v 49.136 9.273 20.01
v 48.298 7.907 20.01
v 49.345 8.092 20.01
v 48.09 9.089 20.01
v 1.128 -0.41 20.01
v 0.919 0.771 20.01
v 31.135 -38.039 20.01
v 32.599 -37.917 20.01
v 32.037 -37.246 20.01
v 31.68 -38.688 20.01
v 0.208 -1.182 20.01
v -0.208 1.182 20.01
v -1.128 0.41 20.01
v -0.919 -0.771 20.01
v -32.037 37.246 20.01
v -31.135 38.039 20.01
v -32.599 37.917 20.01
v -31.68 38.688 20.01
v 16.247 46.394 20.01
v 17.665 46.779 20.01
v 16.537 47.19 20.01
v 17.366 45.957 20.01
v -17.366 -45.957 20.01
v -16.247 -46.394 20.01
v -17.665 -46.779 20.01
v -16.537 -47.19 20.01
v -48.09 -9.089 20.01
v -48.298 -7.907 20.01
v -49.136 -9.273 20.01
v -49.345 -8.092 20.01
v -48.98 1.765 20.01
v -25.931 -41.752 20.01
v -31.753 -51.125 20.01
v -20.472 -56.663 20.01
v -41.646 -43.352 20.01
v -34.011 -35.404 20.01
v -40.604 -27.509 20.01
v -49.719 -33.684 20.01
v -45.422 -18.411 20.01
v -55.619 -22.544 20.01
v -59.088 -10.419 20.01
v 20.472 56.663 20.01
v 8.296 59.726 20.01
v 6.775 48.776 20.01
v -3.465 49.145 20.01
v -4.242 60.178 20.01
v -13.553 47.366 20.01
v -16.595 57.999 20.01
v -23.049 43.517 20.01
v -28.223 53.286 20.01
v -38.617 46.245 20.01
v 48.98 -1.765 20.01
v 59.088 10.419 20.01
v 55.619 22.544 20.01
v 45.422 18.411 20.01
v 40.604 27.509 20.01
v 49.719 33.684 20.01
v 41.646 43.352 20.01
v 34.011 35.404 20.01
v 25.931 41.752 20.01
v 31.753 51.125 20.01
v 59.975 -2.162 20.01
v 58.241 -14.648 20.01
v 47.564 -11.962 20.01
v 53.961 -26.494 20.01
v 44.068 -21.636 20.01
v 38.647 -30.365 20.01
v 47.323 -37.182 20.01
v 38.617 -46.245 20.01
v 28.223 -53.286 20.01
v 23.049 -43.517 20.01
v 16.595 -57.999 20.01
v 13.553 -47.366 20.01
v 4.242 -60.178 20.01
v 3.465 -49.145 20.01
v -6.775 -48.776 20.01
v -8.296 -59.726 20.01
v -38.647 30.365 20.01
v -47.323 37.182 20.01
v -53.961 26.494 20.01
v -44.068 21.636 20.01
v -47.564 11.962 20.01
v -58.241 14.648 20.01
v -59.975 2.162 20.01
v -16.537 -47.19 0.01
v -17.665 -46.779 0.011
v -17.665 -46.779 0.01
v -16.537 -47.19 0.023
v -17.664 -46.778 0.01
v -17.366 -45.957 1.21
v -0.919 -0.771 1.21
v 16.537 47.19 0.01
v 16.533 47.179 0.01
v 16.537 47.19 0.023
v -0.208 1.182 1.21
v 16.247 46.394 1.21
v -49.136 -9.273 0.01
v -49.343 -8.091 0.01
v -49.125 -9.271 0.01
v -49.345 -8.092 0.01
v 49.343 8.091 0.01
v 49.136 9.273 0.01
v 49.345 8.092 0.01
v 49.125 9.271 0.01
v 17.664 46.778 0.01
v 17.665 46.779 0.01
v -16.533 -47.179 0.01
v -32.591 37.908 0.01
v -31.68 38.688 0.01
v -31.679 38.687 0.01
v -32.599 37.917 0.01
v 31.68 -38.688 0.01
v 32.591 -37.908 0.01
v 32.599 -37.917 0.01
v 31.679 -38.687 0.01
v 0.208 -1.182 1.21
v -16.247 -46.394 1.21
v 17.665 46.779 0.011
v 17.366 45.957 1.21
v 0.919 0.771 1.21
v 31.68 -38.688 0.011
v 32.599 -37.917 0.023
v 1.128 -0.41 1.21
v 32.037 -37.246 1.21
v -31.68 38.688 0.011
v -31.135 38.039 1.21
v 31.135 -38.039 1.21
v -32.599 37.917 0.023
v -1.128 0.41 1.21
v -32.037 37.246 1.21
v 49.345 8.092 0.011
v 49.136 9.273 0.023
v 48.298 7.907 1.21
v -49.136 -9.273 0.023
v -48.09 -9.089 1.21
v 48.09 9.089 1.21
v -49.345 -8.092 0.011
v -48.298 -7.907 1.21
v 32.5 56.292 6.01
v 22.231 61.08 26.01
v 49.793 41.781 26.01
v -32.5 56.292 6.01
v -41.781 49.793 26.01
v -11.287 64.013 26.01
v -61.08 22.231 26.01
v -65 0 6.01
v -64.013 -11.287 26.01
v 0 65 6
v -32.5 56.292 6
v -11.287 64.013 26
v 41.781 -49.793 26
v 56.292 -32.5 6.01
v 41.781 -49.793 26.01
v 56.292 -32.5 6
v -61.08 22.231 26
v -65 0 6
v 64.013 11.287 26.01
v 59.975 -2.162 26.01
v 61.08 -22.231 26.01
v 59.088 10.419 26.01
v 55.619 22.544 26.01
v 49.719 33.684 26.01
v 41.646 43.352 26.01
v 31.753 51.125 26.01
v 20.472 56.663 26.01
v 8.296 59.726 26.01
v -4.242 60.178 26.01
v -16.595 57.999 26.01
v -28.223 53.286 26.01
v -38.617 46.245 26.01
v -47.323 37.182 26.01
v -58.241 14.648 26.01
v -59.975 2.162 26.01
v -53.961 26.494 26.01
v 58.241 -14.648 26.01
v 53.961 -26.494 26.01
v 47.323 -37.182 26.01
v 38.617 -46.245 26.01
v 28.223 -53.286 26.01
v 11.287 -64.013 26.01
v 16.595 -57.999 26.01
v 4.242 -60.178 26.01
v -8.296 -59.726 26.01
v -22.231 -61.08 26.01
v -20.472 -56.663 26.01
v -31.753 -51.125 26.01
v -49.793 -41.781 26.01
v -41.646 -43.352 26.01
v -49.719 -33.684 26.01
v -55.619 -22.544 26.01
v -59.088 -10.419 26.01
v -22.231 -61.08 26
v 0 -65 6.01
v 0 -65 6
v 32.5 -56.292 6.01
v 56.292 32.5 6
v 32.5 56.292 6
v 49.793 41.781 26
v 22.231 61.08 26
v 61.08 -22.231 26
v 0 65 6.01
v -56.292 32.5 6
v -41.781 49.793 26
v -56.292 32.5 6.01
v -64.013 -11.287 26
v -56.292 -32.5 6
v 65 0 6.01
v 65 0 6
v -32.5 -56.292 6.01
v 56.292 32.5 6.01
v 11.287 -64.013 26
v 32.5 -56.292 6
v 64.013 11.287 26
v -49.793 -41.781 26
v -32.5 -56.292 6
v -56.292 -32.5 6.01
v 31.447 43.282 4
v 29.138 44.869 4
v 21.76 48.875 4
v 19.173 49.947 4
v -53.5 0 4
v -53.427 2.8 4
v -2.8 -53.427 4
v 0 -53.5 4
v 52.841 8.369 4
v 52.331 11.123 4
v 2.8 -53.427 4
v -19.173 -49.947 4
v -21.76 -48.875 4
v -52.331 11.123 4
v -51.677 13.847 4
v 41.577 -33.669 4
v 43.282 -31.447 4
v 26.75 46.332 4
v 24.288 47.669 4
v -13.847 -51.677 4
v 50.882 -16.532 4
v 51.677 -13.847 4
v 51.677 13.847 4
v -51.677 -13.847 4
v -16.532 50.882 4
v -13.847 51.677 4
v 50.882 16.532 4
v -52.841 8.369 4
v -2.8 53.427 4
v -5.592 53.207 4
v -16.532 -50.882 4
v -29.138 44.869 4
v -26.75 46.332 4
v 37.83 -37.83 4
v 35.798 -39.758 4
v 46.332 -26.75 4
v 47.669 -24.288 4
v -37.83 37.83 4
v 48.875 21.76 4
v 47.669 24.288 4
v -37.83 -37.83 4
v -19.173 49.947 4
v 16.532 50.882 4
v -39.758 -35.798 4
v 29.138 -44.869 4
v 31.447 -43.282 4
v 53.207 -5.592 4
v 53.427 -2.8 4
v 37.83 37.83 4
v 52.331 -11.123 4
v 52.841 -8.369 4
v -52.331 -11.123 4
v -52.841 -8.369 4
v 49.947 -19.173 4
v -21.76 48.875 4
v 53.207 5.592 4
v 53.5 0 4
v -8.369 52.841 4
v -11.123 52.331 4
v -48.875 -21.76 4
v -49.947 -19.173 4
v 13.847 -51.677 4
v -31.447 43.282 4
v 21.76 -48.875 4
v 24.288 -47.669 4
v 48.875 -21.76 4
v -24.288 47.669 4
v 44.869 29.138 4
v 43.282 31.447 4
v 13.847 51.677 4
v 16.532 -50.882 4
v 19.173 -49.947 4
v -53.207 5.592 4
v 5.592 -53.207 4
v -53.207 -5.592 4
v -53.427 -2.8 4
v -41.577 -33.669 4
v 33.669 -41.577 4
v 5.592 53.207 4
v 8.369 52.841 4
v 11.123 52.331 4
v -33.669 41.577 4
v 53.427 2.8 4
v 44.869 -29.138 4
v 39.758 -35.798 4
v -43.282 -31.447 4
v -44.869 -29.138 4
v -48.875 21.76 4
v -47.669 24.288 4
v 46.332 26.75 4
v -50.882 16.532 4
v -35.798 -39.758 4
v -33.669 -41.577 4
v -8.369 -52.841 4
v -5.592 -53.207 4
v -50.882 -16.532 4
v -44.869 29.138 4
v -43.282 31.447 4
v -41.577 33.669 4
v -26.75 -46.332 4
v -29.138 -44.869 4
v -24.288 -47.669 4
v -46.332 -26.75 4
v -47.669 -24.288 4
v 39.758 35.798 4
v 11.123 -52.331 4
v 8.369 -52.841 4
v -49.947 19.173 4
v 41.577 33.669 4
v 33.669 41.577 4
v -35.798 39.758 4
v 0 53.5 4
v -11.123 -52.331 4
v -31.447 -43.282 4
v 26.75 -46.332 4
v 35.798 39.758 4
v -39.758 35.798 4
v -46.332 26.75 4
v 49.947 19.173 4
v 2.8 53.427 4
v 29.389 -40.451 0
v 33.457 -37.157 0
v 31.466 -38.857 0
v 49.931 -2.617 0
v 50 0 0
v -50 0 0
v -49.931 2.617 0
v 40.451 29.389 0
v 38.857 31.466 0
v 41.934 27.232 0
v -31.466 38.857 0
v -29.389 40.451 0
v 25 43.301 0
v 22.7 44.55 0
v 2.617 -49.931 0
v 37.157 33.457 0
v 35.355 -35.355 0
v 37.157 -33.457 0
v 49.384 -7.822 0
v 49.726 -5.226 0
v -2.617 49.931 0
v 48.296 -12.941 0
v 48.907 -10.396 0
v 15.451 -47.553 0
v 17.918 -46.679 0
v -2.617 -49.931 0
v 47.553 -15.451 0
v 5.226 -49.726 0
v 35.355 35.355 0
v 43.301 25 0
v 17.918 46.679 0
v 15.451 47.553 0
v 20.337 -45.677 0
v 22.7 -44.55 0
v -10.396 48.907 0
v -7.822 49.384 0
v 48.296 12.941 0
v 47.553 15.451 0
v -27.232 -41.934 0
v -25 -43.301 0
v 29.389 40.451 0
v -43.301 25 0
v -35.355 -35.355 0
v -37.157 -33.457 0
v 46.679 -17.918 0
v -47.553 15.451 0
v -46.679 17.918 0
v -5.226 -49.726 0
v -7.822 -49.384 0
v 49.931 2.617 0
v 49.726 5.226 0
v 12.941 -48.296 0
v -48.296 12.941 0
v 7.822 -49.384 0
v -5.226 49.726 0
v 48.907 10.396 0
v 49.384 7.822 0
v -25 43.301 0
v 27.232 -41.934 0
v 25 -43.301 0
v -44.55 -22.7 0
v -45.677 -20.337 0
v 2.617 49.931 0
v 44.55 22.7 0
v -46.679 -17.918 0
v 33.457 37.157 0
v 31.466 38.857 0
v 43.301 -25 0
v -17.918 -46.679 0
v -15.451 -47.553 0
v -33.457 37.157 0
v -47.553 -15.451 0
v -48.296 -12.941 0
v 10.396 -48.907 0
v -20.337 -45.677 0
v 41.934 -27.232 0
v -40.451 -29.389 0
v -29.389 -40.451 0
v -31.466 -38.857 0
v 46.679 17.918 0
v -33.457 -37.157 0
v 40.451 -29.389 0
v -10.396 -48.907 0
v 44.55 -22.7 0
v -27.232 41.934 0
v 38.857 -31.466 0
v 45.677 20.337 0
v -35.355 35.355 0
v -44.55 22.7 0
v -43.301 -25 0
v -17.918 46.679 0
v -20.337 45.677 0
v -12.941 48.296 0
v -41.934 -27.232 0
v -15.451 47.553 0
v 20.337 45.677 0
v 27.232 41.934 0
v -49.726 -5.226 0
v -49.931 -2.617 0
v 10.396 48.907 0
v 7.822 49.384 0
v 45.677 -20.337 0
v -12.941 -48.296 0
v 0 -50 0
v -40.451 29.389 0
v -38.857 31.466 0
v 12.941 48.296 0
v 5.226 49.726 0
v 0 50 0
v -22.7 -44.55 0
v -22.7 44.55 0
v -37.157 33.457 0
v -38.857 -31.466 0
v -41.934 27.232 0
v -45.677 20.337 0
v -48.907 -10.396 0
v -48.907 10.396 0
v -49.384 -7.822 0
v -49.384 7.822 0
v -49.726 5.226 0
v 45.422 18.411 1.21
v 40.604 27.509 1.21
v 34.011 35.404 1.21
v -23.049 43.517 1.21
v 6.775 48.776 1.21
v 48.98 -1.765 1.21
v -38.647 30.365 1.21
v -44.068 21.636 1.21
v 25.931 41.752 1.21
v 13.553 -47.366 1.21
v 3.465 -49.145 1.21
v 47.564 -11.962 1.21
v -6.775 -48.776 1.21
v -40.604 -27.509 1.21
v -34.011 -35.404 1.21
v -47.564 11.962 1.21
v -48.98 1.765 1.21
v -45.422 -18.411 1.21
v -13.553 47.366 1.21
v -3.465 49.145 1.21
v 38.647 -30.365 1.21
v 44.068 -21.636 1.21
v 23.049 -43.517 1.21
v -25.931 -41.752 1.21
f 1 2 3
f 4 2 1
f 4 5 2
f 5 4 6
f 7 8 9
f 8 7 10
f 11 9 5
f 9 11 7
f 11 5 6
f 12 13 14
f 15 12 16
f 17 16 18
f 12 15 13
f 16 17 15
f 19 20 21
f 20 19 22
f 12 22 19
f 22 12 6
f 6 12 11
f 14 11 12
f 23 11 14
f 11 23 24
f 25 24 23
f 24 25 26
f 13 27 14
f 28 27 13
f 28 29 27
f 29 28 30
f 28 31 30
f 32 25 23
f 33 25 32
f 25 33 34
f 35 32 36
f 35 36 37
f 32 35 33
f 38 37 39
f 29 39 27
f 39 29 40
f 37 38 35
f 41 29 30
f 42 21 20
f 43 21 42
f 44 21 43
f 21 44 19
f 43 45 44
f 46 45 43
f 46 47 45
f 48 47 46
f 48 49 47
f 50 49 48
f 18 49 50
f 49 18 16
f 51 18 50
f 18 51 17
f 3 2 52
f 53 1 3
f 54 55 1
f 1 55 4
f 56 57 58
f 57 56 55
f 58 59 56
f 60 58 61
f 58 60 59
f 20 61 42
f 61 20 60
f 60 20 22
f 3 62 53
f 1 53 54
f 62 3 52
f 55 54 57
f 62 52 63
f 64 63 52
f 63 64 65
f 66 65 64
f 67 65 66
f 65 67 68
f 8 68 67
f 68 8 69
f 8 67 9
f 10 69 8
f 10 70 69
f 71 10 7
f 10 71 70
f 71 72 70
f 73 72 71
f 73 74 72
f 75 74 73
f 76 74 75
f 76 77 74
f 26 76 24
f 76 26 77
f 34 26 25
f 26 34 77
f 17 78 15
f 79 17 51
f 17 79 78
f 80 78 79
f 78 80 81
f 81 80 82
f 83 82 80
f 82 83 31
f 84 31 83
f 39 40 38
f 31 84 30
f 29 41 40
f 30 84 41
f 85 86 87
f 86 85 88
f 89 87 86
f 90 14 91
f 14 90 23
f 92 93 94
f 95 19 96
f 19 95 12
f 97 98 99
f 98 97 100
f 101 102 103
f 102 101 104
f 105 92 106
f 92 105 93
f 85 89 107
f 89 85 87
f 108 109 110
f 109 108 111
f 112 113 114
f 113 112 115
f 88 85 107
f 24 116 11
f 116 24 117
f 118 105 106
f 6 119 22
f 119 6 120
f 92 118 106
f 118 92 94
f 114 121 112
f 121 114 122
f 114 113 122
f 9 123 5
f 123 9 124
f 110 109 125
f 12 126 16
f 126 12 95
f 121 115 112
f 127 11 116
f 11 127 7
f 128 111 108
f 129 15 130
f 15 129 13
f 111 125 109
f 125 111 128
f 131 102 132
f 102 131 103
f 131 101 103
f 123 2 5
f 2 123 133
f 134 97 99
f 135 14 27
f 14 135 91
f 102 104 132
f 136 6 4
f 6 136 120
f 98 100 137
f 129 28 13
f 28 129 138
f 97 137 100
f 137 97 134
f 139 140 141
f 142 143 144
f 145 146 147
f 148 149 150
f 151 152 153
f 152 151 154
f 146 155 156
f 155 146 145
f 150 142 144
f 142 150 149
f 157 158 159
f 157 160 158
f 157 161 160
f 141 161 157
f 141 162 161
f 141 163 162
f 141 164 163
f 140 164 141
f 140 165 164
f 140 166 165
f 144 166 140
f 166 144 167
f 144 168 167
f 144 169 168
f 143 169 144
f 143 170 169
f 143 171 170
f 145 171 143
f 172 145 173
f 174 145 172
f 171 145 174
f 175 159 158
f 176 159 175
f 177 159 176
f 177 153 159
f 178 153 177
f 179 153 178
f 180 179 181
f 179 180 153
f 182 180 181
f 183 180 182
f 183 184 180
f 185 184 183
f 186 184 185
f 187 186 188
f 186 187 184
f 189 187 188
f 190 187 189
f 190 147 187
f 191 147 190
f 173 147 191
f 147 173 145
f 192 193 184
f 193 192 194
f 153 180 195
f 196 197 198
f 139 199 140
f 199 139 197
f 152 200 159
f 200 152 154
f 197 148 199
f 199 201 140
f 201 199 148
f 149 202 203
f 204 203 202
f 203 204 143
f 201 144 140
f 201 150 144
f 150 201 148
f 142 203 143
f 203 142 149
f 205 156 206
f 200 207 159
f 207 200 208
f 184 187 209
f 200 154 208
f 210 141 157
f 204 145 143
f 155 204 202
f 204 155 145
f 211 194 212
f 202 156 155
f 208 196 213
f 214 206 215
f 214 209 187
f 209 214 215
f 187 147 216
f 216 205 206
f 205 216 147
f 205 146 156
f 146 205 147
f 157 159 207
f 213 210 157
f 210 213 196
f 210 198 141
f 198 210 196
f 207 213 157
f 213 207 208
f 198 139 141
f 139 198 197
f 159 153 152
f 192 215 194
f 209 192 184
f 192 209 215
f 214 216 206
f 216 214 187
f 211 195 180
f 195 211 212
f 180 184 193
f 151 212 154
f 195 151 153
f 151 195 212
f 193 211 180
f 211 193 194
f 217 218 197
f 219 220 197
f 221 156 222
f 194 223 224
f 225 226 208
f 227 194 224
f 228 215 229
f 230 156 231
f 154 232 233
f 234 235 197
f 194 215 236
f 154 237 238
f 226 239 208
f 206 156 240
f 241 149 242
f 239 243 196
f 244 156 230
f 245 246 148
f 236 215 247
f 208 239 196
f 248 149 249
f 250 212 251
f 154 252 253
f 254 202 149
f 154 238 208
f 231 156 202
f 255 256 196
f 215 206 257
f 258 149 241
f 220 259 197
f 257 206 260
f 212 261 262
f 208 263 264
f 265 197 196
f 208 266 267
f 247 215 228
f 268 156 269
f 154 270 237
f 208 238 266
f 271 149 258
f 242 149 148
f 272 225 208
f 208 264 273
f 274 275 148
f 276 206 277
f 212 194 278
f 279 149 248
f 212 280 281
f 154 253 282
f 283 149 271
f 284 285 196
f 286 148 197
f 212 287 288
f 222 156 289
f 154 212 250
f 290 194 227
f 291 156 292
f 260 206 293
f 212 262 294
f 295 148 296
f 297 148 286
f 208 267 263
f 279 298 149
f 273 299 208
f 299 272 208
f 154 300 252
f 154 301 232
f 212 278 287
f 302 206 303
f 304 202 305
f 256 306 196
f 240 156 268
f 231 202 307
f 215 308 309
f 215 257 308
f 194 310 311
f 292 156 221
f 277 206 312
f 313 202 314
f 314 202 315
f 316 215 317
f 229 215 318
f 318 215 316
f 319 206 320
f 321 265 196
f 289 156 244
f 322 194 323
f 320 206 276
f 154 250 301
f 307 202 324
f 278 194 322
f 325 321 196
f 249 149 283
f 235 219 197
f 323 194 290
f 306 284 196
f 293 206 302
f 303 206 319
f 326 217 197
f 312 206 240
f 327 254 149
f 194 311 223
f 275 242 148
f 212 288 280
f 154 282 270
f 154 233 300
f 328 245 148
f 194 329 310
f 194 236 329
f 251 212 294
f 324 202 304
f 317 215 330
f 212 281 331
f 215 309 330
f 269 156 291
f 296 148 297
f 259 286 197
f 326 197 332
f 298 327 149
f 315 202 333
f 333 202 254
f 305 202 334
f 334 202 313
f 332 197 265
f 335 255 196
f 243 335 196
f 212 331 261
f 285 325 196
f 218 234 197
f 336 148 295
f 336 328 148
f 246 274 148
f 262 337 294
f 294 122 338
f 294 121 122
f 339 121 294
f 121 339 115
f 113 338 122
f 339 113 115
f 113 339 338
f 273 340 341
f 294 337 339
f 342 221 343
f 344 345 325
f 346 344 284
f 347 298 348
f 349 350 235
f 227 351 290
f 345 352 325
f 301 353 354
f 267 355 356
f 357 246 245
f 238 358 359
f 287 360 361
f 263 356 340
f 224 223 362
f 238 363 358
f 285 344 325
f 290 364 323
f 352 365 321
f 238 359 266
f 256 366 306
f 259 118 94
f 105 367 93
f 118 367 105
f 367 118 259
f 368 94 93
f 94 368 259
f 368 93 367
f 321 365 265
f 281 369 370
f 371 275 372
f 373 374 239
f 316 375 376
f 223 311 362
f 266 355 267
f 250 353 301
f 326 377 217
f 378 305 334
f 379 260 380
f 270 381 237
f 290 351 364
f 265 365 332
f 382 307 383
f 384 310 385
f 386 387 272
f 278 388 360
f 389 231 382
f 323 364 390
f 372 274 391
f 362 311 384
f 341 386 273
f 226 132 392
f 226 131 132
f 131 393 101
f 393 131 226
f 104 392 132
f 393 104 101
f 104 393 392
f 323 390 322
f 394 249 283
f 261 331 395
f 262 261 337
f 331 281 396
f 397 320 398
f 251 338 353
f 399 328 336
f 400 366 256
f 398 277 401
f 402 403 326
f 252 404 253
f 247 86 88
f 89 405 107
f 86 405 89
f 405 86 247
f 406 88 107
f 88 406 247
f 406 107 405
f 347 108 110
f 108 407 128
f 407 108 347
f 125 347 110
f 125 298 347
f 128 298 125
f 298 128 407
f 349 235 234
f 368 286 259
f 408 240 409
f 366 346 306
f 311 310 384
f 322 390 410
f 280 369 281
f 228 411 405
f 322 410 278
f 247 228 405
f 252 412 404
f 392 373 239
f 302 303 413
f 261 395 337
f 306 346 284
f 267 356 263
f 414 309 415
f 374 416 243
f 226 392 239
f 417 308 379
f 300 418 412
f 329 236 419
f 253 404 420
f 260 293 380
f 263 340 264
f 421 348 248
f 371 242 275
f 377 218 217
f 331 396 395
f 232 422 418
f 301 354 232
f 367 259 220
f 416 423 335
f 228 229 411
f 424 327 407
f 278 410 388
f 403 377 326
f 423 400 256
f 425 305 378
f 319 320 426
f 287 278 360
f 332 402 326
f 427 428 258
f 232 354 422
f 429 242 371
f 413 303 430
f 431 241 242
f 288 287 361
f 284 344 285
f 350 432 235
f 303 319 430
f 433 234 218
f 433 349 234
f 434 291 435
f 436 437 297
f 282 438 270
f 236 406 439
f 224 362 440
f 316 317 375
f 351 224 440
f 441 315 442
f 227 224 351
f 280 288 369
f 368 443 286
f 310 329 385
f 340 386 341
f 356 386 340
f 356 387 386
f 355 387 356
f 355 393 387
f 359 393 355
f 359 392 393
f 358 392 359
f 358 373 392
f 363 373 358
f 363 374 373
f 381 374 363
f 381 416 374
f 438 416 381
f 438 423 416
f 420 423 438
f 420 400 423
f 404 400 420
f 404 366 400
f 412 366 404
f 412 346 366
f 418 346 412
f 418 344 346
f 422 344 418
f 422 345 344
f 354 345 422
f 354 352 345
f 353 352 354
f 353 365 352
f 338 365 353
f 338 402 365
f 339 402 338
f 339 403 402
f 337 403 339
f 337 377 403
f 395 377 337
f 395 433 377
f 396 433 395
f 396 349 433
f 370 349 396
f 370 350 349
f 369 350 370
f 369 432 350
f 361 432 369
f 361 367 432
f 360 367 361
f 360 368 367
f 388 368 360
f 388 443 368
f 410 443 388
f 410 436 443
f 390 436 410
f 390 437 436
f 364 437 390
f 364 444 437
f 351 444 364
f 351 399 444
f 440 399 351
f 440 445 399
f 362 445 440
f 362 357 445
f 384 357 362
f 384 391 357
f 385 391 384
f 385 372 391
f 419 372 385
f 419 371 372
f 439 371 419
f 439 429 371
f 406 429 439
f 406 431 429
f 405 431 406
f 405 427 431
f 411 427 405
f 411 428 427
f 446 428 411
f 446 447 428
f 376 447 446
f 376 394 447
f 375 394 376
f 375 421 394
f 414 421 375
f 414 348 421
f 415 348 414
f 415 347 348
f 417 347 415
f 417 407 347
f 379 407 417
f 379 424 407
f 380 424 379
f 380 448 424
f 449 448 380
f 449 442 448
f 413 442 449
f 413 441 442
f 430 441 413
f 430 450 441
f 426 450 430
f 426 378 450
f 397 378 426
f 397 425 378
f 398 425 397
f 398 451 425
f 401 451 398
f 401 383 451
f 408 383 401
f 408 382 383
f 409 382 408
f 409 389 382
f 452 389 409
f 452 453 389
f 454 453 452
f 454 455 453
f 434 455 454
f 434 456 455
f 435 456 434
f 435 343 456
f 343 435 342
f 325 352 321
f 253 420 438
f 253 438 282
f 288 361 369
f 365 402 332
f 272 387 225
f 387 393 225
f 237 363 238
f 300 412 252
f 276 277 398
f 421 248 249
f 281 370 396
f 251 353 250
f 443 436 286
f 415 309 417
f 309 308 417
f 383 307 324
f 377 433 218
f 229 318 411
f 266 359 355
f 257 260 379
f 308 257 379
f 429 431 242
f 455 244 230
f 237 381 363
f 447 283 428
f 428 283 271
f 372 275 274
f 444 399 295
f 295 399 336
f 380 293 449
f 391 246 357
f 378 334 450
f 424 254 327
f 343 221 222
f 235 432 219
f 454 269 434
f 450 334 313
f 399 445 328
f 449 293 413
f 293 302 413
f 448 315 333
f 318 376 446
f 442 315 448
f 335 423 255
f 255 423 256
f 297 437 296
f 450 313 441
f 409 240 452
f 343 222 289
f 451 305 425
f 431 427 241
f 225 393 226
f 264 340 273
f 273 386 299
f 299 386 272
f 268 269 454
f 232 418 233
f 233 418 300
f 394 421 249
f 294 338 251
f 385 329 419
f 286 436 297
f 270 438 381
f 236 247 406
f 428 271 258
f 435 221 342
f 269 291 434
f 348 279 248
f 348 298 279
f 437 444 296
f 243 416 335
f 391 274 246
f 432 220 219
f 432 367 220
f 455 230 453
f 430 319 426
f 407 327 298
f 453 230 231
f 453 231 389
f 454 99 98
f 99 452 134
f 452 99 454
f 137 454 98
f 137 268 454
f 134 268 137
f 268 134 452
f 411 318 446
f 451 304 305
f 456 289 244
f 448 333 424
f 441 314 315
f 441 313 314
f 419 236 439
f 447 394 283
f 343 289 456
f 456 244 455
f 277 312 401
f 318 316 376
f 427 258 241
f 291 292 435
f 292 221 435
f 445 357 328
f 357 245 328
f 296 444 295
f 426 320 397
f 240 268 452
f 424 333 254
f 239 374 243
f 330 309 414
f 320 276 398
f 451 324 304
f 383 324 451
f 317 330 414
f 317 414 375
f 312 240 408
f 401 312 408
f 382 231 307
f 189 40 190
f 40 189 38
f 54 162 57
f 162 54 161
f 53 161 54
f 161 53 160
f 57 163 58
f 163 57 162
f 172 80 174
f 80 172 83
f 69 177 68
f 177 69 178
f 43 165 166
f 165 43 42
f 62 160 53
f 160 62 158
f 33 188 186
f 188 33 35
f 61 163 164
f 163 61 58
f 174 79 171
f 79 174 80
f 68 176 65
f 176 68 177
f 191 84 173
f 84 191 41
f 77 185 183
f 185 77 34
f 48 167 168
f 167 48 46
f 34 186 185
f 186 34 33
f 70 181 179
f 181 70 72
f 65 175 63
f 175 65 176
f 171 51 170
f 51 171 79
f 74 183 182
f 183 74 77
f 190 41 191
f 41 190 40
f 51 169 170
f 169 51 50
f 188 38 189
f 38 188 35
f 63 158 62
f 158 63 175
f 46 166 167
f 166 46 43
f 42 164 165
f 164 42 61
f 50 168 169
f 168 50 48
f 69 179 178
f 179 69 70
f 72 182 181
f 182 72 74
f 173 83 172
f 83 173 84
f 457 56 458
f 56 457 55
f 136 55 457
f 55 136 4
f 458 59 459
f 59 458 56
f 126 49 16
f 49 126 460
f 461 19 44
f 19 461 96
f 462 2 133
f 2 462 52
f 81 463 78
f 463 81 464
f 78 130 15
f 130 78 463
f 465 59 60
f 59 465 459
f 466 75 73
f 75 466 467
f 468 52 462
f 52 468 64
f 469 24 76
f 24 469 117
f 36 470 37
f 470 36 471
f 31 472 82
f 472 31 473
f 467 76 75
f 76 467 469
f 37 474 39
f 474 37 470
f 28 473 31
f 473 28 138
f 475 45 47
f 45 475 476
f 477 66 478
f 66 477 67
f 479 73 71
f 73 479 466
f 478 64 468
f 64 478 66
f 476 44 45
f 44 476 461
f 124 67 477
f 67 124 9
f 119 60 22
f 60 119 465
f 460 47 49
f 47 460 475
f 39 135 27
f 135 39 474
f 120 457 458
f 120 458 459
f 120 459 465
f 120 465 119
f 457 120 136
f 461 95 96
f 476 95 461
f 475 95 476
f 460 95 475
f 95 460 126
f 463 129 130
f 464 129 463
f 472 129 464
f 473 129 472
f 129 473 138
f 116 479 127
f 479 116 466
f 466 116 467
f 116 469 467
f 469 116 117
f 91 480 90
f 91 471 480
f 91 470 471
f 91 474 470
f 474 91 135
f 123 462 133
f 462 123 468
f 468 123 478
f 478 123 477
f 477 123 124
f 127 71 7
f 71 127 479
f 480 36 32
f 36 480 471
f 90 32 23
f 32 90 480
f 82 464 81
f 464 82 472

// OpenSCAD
include <../../lib/relativity.scad/relativity.scad> // https://github.com/davidson16807/relativity.scad

// print settings:
// infill 15%
// layer height: 0.3mm
// perimeters: 3
// bottom solid layers: 3

height = 20;
d_inner = 120;
edges = 12;
d_outer = d_inner + 10;
d_bottom = d_outer - 30;

differed("cut", "not(cut)", "rib")
   hulled("bottom1") 
   hulled("bottom2") 
   hulled("side")
    rod(d=d_bottom, h=4, anchor=bottom, $class="bottom1", $fn=120)
      align(top) rod(d=d_bottom+7, h=0.01, anchor=bottom)
      align(bottom) rod(d=d_bottom+7, h=2, anchor=bottom, $class="bottom2")
        align(top) rod(d=d_outer, h=0.01, anchor=bottom, $fn=edges)
        align(bottom) rod(d=d_outer, h=0.01, anchor=bottom, $class="side")
          translated(height*z) align(bottom) rotated(360/edges/3*z) rod(d=d_outer, h=0.01, anchor=bottom)
            align(top) rod(d=d_inner, h=6, anchor=top, $class="cut", $fn=30)
              align(bottom) {
                rod(d=d_bottom-2, h=height-1.2, anchor=top);
                rotated(60*z, n=[1:3]) box([d_bottom, 1.2, height], anchor=top, $class="rib");
              } 
